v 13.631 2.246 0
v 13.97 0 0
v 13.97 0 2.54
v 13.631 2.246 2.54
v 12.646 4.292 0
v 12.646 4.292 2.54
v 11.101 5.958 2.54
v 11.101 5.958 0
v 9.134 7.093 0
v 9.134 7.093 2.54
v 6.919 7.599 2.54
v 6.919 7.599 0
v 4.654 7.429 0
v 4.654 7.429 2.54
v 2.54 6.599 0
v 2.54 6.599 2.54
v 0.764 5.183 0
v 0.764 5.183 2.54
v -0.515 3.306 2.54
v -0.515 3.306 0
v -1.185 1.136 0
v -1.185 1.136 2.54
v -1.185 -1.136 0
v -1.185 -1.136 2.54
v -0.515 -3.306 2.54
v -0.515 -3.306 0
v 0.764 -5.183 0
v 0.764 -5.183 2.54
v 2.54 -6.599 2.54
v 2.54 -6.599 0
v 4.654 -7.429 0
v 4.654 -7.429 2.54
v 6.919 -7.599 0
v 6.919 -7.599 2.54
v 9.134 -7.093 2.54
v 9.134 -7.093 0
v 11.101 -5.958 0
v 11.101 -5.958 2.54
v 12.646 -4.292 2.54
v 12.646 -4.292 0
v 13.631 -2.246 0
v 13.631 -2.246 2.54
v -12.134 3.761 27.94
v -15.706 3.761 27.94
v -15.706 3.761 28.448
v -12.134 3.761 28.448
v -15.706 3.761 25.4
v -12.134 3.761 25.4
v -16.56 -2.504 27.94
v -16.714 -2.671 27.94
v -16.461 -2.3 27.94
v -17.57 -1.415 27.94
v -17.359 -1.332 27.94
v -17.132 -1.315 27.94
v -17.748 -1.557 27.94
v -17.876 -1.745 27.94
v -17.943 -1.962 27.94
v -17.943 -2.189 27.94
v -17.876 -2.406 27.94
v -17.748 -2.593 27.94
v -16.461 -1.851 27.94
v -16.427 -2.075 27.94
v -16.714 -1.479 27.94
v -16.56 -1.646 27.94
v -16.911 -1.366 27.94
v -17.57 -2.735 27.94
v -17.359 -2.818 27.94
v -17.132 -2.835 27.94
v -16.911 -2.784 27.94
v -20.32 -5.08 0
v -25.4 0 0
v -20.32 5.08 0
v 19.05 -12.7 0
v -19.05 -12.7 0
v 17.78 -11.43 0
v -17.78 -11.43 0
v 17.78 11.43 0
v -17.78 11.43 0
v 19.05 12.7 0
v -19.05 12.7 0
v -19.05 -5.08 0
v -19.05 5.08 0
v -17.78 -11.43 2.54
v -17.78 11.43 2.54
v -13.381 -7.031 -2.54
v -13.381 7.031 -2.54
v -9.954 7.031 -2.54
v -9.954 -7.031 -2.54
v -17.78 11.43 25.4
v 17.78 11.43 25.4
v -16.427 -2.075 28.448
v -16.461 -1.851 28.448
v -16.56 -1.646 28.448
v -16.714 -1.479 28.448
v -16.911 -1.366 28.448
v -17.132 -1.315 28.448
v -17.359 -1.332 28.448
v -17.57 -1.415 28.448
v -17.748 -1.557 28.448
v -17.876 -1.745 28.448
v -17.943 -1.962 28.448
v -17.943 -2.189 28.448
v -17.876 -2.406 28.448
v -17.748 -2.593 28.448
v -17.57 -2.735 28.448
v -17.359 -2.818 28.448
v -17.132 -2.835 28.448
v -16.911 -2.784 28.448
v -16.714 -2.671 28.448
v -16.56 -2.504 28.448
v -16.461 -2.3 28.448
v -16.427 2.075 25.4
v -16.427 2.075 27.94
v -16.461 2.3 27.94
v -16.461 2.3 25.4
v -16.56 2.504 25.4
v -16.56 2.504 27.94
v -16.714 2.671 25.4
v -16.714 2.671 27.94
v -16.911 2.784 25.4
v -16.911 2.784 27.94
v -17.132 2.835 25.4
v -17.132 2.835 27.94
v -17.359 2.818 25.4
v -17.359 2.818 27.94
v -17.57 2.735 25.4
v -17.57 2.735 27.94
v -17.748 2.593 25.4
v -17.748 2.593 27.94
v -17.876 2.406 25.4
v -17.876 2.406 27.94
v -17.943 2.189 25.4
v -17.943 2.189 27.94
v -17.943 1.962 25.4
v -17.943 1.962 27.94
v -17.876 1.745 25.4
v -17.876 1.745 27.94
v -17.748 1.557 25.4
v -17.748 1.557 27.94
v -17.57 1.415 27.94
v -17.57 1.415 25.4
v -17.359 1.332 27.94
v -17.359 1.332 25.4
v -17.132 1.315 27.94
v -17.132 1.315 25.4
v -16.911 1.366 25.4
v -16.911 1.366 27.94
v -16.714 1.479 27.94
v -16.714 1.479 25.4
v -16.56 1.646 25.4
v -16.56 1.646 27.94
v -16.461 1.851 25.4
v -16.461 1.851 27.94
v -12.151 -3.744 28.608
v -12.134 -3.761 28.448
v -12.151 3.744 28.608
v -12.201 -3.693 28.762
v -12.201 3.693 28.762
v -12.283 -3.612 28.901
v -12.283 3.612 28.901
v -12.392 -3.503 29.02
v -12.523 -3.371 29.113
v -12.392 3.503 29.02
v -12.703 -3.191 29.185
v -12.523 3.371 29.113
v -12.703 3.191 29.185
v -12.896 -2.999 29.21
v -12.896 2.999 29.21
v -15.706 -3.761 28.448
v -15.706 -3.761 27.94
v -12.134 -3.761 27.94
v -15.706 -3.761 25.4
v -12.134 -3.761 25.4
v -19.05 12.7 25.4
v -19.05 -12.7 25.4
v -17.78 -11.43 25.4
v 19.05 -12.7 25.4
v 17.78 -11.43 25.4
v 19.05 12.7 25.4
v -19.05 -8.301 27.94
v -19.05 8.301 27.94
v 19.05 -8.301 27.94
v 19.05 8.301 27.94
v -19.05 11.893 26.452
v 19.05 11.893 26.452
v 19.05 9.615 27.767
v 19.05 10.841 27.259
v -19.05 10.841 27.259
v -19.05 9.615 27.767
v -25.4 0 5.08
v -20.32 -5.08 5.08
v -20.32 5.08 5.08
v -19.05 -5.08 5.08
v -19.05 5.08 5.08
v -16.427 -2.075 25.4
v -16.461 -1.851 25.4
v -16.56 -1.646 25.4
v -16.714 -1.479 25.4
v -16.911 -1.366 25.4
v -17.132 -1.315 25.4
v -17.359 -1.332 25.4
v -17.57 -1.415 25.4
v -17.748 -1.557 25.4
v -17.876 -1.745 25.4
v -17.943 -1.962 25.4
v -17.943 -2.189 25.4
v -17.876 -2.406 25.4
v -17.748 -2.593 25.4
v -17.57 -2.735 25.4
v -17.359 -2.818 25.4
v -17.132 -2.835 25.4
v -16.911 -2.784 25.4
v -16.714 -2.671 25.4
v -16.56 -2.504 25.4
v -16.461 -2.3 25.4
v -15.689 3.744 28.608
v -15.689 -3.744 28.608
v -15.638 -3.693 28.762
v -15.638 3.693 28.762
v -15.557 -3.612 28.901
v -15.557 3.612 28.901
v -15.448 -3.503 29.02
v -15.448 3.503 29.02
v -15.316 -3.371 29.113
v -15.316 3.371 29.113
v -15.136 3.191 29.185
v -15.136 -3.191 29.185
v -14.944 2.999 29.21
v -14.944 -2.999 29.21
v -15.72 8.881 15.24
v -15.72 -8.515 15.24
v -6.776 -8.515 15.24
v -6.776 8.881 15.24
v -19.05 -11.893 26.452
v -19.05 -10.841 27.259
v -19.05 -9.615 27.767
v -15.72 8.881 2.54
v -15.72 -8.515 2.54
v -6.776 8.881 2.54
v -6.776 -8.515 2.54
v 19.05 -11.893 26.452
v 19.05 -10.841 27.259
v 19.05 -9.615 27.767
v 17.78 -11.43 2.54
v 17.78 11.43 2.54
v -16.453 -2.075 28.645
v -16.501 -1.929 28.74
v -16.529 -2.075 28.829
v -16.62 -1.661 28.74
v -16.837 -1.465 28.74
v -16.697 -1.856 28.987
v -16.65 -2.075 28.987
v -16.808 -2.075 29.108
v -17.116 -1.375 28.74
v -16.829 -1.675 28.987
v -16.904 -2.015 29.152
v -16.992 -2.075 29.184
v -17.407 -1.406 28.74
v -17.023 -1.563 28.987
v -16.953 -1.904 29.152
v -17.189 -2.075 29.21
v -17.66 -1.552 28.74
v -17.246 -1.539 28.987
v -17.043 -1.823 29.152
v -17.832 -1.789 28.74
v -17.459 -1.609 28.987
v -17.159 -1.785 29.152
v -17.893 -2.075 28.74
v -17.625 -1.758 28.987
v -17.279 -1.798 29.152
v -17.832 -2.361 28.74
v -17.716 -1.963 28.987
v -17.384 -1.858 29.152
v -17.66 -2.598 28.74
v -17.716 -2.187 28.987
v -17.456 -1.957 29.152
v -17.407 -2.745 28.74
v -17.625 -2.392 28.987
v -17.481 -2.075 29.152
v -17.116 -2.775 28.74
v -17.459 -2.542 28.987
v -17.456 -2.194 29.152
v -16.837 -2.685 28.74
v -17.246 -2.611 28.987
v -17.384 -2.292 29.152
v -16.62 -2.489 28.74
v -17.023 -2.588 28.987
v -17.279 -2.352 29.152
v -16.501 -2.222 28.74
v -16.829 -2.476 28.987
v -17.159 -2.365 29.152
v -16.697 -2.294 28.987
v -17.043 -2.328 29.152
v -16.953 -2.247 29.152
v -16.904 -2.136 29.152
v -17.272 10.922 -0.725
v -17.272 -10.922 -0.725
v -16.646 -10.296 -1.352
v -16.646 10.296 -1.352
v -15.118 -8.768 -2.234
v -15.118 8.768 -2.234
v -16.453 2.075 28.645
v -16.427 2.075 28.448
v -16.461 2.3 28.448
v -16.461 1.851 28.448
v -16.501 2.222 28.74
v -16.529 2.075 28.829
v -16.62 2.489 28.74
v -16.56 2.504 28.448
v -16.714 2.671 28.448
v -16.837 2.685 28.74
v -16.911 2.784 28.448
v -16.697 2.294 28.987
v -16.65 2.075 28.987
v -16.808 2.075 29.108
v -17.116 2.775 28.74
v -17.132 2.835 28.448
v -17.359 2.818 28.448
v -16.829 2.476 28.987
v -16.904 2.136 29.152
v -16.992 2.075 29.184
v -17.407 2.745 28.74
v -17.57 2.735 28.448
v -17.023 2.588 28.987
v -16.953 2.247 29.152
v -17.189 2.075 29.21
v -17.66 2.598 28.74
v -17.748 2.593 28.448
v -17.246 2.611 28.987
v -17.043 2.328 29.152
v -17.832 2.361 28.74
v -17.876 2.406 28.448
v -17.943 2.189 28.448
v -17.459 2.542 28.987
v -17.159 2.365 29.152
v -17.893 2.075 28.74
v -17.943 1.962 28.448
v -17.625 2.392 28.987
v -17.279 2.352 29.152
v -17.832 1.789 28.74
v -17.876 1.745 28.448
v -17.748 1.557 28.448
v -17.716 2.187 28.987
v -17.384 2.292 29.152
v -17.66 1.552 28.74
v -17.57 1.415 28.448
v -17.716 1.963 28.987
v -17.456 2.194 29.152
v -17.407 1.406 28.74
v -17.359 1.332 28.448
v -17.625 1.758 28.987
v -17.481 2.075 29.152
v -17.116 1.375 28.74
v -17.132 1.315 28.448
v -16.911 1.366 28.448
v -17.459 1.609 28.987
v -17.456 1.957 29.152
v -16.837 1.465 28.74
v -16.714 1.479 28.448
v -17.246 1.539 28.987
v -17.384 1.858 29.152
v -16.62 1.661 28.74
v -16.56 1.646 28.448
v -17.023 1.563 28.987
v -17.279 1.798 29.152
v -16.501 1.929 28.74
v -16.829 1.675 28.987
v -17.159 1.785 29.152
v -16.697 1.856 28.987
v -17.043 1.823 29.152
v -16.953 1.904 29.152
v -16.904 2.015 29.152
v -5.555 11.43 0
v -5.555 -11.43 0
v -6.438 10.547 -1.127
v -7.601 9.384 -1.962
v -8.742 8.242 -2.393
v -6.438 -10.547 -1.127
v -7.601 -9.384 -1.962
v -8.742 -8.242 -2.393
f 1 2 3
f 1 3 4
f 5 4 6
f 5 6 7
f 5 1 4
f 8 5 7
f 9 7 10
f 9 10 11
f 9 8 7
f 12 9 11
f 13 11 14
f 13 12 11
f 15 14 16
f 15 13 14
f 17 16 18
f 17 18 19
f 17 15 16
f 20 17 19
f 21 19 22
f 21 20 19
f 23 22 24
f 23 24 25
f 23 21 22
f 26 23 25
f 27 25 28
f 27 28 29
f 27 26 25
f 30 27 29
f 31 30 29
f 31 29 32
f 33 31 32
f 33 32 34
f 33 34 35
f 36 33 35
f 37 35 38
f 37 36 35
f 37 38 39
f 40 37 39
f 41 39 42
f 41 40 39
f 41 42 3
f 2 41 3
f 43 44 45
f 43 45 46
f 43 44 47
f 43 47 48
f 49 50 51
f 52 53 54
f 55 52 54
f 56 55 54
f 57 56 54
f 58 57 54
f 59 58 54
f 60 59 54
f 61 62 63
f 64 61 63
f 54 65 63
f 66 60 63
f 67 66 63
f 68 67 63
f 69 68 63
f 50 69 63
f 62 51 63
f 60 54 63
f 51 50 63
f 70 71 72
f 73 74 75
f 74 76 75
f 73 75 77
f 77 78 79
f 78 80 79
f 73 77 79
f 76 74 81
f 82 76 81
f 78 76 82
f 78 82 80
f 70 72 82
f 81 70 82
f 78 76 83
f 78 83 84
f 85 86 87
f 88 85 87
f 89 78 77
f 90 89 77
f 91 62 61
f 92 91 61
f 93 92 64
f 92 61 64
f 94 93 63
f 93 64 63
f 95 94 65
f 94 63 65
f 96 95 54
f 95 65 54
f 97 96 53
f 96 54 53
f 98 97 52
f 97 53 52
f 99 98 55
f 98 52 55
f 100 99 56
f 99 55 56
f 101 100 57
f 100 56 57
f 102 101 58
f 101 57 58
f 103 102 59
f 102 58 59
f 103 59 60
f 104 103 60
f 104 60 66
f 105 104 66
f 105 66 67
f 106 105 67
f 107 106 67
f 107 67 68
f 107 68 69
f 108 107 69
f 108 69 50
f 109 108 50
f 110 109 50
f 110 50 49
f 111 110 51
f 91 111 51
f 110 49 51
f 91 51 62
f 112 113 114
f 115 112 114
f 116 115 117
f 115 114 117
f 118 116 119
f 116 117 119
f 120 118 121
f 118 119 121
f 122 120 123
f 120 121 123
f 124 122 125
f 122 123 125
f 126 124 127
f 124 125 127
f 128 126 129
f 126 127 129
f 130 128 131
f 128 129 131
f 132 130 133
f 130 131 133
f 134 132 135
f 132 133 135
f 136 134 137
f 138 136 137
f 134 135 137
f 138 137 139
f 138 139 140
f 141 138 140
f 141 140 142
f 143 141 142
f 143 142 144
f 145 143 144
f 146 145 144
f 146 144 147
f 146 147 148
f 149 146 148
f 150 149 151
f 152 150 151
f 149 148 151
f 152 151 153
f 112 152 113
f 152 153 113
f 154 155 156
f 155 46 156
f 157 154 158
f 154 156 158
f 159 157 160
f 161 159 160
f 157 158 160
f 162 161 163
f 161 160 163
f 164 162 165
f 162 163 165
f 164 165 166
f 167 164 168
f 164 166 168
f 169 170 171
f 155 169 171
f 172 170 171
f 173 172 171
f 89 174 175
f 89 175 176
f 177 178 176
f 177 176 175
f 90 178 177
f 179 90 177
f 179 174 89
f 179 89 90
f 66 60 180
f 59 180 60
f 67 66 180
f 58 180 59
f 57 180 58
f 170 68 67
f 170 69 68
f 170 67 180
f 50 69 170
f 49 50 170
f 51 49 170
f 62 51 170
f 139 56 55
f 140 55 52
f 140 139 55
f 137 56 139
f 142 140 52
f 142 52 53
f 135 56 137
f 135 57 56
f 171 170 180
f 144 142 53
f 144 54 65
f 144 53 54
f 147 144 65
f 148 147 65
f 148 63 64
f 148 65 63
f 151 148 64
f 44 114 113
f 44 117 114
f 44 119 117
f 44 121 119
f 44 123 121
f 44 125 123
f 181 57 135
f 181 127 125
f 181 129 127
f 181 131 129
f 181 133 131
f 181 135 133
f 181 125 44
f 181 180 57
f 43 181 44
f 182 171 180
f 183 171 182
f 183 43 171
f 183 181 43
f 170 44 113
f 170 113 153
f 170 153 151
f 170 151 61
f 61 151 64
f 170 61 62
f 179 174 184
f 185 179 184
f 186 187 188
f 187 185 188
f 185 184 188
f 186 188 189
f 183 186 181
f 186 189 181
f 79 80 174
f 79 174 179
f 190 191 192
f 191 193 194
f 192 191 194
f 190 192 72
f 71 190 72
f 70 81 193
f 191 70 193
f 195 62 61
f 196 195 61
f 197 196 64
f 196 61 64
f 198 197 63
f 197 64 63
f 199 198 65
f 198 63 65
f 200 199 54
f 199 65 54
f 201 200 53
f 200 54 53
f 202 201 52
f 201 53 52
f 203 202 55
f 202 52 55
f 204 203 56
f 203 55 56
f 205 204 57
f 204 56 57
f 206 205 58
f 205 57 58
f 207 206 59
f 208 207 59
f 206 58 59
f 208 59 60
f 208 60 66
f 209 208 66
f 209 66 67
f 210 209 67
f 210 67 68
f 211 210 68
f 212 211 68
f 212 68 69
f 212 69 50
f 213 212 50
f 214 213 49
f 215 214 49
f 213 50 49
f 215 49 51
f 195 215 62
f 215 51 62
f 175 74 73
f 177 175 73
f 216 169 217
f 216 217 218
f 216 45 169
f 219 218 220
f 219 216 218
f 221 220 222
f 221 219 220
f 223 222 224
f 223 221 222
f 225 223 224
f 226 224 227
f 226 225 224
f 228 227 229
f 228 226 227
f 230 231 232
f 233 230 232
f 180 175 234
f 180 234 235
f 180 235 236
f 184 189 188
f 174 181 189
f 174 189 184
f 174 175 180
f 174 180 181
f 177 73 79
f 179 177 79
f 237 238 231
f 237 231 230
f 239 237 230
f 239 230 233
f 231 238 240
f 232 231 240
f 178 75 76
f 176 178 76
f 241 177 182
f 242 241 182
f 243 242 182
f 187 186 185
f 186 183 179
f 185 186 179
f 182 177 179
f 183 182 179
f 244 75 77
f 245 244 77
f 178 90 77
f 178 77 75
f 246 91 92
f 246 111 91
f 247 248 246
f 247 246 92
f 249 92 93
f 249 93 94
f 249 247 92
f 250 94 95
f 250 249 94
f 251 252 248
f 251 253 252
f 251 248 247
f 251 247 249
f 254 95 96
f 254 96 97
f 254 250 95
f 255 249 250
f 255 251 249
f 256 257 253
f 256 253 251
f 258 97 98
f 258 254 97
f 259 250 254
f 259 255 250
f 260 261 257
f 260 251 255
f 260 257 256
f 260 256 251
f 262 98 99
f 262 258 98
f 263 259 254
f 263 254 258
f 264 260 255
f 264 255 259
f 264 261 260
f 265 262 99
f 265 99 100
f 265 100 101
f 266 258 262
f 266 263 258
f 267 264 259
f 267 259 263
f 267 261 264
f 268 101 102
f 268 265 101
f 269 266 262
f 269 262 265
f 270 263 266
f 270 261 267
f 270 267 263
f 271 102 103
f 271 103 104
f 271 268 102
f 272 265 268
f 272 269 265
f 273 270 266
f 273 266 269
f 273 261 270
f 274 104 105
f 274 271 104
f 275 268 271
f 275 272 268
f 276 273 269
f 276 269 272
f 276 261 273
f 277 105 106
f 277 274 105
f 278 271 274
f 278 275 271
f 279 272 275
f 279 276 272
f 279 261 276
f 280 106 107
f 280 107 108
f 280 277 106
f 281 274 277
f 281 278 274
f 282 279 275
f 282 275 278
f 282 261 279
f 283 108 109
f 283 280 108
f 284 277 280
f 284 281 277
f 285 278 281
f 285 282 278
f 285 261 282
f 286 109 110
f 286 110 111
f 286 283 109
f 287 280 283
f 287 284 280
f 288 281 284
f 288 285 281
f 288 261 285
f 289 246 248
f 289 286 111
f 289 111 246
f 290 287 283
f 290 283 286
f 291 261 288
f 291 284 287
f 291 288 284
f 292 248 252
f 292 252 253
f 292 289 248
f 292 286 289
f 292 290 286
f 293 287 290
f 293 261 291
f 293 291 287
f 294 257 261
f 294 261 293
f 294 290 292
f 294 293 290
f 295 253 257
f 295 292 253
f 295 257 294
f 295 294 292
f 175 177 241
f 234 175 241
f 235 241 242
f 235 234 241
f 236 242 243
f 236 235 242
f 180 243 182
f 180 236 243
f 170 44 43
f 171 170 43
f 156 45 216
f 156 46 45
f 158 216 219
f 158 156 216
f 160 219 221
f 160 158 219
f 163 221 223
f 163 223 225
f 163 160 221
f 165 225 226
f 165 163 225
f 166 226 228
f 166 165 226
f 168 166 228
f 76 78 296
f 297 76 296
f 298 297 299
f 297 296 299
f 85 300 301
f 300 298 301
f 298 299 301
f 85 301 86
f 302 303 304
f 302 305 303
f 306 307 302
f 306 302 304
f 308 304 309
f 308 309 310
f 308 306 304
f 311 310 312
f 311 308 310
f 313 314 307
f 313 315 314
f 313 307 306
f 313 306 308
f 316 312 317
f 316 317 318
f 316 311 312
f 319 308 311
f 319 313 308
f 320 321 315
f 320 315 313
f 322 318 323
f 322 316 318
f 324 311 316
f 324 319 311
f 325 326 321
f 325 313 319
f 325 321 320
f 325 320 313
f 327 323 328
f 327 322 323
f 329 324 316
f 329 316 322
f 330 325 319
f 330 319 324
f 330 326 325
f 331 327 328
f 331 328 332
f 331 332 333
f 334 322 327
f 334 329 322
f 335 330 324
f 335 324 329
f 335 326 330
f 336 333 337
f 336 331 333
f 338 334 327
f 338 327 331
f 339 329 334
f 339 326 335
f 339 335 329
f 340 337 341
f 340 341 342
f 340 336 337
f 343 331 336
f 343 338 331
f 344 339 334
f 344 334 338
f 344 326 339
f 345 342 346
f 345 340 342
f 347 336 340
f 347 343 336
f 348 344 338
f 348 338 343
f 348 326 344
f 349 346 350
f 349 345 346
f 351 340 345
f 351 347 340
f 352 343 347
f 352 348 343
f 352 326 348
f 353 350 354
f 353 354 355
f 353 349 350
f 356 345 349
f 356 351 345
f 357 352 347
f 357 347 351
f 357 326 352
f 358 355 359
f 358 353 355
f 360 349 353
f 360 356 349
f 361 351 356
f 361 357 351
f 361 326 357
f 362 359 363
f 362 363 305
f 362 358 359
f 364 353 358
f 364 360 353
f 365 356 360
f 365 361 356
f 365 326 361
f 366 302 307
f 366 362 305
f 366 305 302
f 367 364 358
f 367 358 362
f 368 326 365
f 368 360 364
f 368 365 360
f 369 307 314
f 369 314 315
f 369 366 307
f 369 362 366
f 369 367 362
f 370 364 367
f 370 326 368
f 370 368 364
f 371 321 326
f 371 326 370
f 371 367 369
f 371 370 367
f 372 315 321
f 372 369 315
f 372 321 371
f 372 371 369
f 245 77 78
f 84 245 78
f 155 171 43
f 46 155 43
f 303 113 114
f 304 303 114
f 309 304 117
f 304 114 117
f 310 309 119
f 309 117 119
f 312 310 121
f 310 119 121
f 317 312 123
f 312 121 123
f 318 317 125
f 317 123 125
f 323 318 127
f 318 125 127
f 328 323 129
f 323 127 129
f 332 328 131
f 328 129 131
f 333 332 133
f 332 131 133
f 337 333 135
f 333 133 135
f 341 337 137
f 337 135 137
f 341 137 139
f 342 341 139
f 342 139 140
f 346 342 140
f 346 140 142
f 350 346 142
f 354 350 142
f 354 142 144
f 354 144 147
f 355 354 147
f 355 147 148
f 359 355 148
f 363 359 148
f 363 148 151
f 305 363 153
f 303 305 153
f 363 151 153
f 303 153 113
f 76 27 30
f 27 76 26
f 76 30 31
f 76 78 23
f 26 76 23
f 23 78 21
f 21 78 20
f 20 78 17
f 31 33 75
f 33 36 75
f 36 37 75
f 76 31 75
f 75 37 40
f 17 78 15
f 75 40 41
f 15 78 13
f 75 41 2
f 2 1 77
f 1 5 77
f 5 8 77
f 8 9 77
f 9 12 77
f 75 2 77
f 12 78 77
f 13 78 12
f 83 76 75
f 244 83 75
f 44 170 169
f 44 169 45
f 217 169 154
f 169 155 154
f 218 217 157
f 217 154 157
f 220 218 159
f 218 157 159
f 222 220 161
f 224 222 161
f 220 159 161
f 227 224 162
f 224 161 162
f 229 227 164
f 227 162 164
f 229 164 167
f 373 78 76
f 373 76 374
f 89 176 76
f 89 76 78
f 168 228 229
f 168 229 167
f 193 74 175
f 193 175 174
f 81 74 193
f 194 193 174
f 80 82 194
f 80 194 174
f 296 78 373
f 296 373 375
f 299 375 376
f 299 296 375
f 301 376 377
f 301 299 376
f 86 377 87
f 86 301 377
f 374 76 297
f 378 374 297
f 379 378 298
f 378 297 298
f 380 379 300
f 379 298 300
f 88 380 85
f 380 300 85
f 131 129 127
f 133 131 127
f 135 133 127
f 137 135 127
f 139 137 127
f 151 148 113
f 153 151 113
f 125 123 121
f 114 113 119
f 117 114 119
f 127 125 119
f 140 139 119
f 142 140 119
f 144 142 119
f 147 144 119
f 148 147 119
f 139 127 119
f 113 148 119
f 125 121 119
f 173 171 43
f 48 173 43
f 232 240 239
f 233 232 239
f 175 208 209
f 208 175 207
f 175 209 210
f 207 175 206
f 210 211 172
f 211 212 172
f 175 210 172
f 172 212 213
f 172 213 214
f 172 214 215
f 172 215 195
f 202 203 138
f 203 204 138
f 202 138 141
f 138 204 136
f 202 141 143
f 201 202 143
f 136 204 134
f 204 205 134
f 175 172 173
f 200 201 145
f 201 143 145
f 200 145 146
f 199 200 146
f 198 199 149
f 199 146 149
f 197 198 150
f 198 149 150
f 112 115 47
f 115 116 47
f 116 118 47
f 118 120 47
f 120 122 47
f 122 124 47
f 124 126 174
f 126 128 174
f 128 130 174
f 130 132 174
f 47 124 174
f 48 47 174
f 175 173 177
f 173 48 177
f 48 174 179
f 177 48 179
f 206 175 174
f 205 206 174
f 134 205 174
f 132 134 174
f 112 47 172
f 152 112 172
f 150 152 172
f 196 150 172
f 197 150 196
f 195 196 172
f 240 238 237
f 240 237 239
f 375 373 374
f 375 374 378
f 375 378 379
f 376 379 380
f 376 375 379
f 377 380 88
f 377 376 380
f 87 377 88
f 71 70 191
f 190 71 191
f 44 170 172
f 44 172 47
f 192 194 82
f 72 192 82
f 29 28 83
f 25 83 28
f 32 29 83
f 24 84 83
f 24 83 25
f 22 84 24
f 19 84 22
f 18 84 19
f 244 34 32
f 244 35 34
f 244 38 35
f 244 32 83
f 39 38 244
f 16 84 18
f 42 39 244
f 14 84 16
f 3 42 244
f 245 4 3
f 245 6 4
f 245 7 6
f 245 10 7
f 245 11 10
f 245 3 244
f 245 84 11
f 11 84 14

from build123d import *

# Parameters (mm, degrees)
F0_W        = 38.1
F0_H        = 25.4
F1_DEPTH    = 25.4
F0_W_2      = 12.2251660849
F0_H_2      = 22.86
F2_DEPTH    = 2.54
F0_W_3      = 23.3348339151
F0_R        = 7.62
F3_DEPTH    = 2.54
F4_W        = 38.1
F4_H        = 25.4
F5_DEPTH    = 2.54
F6_T1_DEPTH = 44.8570452561
F6_T3_DEPTH = 34.222211341
F7_T1_DEPTH = 60.0970452561
F9_DEPTH    = 6.35
F10_SIZE    = 5.07999
F11_W       = 8.943406865
F11_H       = 17.3965319991
F12_DEPTH   = 12.7
F13_R       = 0.762
F13_W       = 3.5719834268
F13_H       = 7.5215632096
F14_DEPTH   = 2.54
F15_DEPTH   = 1.27
F16_R       = 0.762
F16_2_R     = 0.762
F16_3_R     = 0.762


# Not quite as in the source:
# - a fillet or chamfer that OpenCascade refuses, or shapes differently, is made with other operations: its cross-section is extruded or revolved along the edge and cut away or added
# - a fillet or chamfer is up to 0.001 mm smaller than in the source, because OpenCascade refuses the exact size


with BuildPart() as f1:
    # F0 (on Top) → F1 (new body)
    with BuildSketch(Plane.XY):
        Rectangle(F0_W, F0_H)
        Polygon((-17.78, -11.43), (-17.78, 11.43), (-5.5548339151, 11.43), (17.78, 11.43), (17.78, -11.43), (-5.5548339151, -11.43), align=None, mode=Mode.SUBTRACT)
    extrude(amount=F1_DEPTH)

    # F8 (on face) → F9 (join)
    with BuildSketch(Plane(origin=(-19.05, 0, 0), x_dir=(0, -1, 0), z_dir=(-1, 0, 0))):
        Polygon((-5.08, 0), (0, 0), (5.08, 0), (5.08, 5.08), (0, 5.08), (-5.08, 5.08), align=None)
    extrude(amount=F9_DEPTH)

    # F10 (size 5.08 in the source; OpenCascade refuses exactly that, so slightly less here)
    f10_edges = [f1.edges().sort_by_distance(p)[0] for p in [
        (-25.4, -5.08, 2.54),
        (-25.4, 5.08, 2.54),
    ]]
    chamfer(f10_edges, length=F10_SIZE)


with BuildPart() as f2:
    # F0 (on Top) → F2 (new body)
    with BuildSketch(Plane.XY):
        with Locations((-11.6674169575, 0)):
            Rectangle(F0_W_2, F0_H_2)
    extrude(amount=-F2_DEPTH)

    # F6: fillet of radius 5.08 on 4 edges, made by hand

    # F6_s2 → F6_t1 (cut)
    with BuildSketch(Plane.XZ.offset(-22.4285226281)):
        with BuildLine():
            ThreePointArc((-17.78, 0), (-15.9205909488, -1.8594090512), (-13.3805909488, -2.54))
            Line((-13.3805909488, -2.54), (-17.78, -2.54))
            Line((-17.78, -2.54), (-17.78, 0))
        make_face()
        with BuildLine():
            ThreePointArc((-5.5548339151, 0), (-7.4142429663, -1.8594090512), (-9.9542429663, -2.54))
            Line((-9.9542429663, -2.54), (-5.5548339151, -2.54))
            Line((-5.5548339151, -2.54), (-5.5548339151, 0))
        make_face()
    extrude(amount=F6_T1_DEPTH, mode=Mode.SUBTRACT)

    # F6_s4 → F6_t3 (cut)
    with BuildSketch(Plane.YZ.offset(-28.7785226281)):
        with BuildLine():
            ThreePointArc((-11.43, 0), (-9.5705909488, -1.8594090512), (-7.0305909488, -2.54))
            Line((-7.0305909488, -2.54), (-11.43, -2.54))
            Line((-11.43, -2.54), (-11.43, 0))
        make_face()
        with BuildLine():
            ThreePointArc((11.43, 0), (9.5705909488, -1.8594090512), (7.0305909488, -2.54))
            Line((7.0305909488, -2.54), (11.43, -2.54))
            Line((11.43, -2.54), (11.43, 0))
        make_face()
    extrude(amount=F6_T3_DEPTH, mode=Mode.SUBTRACT)


with BuildPart() as f3:
    # F0 (on Top) → F3 (new body)
    with BuildSketch(Plane.XY):
        with Locations((6.1125830425, 0)):
            Rectangle(F0_W_3, F0_H_2)
        with Locations((6.35, 0)):
            Circle(F0_R, mode=Mode.SUBTRACT)
        with Locations((-11.6674169575, 0)):
            Rectangle(F0_W_2, F0_H_2)
    extrude(amount=F3_DEPTH)


with BuildPart() as f5:
    # F4 (on face) → F5 (new body)
    with BuildSketch(Plane.XY.offset(25.4)):
        Rectangle(F4_W, F4_H)
    extrude(amount=F5_DEPTH)

    # F7: fillet of radius 5.08 on 2 edges, made by hand

    # F7_s2 → F7_t1 (cut)
    with BuildSketch(Plane.YZ.offset(-30.0485226281)):
        with BuildLine():
            ThreePointArc((12.7, 25.4), (10.8405909488, 27.2594090512), (8.3005909488, 27.94))
            Line((8.3005909488, 27.94), (12.7, 27.94))
            Line((12.7, 27.94), (12.7, 25.4))
        make_face()
        with BuildLine():
            ThreePointArc((-12.7, 25.4), (-10.8405909488, 27.2594090512), (-8.3005909488, 27.94))
            Line((-8.3005909488, 27.94), (-12.7, 27.94))
            Line((-12.7, 27.94), (-12.7, 25.4))
        make_face()
    extrude(amount=F7_T1_DEPTH, mode=Mode.SUBTRACT)

    # F13 (on face) → F14 (cut, through all)
    with BuildSketch(Plane.XY.offset(27.94)):
        with Locations((-17.189187929, 2.0751477372)):
            Circle(F13_R)
        with Locations((-17.189187929, -2.0751477372)):
            Circle(F13_R)
        with Locations((-13.9197837561, 0)):
            Rectangle(F13_W, F13_H)
    extrude(amount=-F14_DEPTH, mode=Mode.SUBTRACT)


with BuildPart() as f12:
    # F11 (on face) → F12 (new body)
    with BuildSketch(Plane.XY.offset(2.54)):
        with Locations((-11.2478537485, 0.1831492409)):
            Rectangle(F11_W, F11_H)
    extrude(amount=F12_DEPTH)


with BuildPart() as f15:
    # F13 (on face) → F15 (new body)
    with BuildSketch(Plane.XY.offset(27.94)):
        with Locations((-17.189187929, 2.0751477372)):
            Circle(F13_R)
    extrude(amount=F15_DEPTH)

    # F16
    f16_edges = [f15.edges().sort_by_distance(p)[0] for p in [
        (-17.951188, 2.075148, 29.21),
    ]]
    fillet(f16_edges, radius=F16_R)


with BuildPart() as f15b:
    # F13 (on face) → F15, piece 2 (new body)
    with BuildSketch(Plane.XY.offset(27.94)):
        with Locations((-17.189187929, -2.0751477372)):
            Circle(F13_R)
    extrude(amount=F15_DEPTH)

    # F16#2
    f16_2_edges = [f15b.edges().sort_by_distance(p)[0] for p in [
        (-17.951188, -2.075148, 29.21),
    ]]
    fillet(f16_2_edges, radius=F16_2_R)


with BuildPart() as f15c:
    # F13 (on face) → F15, piece 3 (new body)
    with BuildSketch(Plane.XY.offset(27.94)):
        with Locations((-13.9197837561, 0)):
            Rectangle(F13_W, F13_H)
    extrude(amount=F15_DEPTH)

    # F16#3
    f16_3_edges = [f15c.edges().sort_by_distance(p)[0] for p in [
        (-15.705775, 0, 29.21),
        (-13.919784, -3.760782, 29.21),
        (-12.133792, 0, 29.21),
        (-13.919784, 3.760782, 29.21),
    ]]
    fillet(f16_3_edges, radius=F16_3_R)


solid = Compound([f1.part, f2.part, f3.part, f5.part, f12.part, f15.part, f15b.part, f15c.part])
